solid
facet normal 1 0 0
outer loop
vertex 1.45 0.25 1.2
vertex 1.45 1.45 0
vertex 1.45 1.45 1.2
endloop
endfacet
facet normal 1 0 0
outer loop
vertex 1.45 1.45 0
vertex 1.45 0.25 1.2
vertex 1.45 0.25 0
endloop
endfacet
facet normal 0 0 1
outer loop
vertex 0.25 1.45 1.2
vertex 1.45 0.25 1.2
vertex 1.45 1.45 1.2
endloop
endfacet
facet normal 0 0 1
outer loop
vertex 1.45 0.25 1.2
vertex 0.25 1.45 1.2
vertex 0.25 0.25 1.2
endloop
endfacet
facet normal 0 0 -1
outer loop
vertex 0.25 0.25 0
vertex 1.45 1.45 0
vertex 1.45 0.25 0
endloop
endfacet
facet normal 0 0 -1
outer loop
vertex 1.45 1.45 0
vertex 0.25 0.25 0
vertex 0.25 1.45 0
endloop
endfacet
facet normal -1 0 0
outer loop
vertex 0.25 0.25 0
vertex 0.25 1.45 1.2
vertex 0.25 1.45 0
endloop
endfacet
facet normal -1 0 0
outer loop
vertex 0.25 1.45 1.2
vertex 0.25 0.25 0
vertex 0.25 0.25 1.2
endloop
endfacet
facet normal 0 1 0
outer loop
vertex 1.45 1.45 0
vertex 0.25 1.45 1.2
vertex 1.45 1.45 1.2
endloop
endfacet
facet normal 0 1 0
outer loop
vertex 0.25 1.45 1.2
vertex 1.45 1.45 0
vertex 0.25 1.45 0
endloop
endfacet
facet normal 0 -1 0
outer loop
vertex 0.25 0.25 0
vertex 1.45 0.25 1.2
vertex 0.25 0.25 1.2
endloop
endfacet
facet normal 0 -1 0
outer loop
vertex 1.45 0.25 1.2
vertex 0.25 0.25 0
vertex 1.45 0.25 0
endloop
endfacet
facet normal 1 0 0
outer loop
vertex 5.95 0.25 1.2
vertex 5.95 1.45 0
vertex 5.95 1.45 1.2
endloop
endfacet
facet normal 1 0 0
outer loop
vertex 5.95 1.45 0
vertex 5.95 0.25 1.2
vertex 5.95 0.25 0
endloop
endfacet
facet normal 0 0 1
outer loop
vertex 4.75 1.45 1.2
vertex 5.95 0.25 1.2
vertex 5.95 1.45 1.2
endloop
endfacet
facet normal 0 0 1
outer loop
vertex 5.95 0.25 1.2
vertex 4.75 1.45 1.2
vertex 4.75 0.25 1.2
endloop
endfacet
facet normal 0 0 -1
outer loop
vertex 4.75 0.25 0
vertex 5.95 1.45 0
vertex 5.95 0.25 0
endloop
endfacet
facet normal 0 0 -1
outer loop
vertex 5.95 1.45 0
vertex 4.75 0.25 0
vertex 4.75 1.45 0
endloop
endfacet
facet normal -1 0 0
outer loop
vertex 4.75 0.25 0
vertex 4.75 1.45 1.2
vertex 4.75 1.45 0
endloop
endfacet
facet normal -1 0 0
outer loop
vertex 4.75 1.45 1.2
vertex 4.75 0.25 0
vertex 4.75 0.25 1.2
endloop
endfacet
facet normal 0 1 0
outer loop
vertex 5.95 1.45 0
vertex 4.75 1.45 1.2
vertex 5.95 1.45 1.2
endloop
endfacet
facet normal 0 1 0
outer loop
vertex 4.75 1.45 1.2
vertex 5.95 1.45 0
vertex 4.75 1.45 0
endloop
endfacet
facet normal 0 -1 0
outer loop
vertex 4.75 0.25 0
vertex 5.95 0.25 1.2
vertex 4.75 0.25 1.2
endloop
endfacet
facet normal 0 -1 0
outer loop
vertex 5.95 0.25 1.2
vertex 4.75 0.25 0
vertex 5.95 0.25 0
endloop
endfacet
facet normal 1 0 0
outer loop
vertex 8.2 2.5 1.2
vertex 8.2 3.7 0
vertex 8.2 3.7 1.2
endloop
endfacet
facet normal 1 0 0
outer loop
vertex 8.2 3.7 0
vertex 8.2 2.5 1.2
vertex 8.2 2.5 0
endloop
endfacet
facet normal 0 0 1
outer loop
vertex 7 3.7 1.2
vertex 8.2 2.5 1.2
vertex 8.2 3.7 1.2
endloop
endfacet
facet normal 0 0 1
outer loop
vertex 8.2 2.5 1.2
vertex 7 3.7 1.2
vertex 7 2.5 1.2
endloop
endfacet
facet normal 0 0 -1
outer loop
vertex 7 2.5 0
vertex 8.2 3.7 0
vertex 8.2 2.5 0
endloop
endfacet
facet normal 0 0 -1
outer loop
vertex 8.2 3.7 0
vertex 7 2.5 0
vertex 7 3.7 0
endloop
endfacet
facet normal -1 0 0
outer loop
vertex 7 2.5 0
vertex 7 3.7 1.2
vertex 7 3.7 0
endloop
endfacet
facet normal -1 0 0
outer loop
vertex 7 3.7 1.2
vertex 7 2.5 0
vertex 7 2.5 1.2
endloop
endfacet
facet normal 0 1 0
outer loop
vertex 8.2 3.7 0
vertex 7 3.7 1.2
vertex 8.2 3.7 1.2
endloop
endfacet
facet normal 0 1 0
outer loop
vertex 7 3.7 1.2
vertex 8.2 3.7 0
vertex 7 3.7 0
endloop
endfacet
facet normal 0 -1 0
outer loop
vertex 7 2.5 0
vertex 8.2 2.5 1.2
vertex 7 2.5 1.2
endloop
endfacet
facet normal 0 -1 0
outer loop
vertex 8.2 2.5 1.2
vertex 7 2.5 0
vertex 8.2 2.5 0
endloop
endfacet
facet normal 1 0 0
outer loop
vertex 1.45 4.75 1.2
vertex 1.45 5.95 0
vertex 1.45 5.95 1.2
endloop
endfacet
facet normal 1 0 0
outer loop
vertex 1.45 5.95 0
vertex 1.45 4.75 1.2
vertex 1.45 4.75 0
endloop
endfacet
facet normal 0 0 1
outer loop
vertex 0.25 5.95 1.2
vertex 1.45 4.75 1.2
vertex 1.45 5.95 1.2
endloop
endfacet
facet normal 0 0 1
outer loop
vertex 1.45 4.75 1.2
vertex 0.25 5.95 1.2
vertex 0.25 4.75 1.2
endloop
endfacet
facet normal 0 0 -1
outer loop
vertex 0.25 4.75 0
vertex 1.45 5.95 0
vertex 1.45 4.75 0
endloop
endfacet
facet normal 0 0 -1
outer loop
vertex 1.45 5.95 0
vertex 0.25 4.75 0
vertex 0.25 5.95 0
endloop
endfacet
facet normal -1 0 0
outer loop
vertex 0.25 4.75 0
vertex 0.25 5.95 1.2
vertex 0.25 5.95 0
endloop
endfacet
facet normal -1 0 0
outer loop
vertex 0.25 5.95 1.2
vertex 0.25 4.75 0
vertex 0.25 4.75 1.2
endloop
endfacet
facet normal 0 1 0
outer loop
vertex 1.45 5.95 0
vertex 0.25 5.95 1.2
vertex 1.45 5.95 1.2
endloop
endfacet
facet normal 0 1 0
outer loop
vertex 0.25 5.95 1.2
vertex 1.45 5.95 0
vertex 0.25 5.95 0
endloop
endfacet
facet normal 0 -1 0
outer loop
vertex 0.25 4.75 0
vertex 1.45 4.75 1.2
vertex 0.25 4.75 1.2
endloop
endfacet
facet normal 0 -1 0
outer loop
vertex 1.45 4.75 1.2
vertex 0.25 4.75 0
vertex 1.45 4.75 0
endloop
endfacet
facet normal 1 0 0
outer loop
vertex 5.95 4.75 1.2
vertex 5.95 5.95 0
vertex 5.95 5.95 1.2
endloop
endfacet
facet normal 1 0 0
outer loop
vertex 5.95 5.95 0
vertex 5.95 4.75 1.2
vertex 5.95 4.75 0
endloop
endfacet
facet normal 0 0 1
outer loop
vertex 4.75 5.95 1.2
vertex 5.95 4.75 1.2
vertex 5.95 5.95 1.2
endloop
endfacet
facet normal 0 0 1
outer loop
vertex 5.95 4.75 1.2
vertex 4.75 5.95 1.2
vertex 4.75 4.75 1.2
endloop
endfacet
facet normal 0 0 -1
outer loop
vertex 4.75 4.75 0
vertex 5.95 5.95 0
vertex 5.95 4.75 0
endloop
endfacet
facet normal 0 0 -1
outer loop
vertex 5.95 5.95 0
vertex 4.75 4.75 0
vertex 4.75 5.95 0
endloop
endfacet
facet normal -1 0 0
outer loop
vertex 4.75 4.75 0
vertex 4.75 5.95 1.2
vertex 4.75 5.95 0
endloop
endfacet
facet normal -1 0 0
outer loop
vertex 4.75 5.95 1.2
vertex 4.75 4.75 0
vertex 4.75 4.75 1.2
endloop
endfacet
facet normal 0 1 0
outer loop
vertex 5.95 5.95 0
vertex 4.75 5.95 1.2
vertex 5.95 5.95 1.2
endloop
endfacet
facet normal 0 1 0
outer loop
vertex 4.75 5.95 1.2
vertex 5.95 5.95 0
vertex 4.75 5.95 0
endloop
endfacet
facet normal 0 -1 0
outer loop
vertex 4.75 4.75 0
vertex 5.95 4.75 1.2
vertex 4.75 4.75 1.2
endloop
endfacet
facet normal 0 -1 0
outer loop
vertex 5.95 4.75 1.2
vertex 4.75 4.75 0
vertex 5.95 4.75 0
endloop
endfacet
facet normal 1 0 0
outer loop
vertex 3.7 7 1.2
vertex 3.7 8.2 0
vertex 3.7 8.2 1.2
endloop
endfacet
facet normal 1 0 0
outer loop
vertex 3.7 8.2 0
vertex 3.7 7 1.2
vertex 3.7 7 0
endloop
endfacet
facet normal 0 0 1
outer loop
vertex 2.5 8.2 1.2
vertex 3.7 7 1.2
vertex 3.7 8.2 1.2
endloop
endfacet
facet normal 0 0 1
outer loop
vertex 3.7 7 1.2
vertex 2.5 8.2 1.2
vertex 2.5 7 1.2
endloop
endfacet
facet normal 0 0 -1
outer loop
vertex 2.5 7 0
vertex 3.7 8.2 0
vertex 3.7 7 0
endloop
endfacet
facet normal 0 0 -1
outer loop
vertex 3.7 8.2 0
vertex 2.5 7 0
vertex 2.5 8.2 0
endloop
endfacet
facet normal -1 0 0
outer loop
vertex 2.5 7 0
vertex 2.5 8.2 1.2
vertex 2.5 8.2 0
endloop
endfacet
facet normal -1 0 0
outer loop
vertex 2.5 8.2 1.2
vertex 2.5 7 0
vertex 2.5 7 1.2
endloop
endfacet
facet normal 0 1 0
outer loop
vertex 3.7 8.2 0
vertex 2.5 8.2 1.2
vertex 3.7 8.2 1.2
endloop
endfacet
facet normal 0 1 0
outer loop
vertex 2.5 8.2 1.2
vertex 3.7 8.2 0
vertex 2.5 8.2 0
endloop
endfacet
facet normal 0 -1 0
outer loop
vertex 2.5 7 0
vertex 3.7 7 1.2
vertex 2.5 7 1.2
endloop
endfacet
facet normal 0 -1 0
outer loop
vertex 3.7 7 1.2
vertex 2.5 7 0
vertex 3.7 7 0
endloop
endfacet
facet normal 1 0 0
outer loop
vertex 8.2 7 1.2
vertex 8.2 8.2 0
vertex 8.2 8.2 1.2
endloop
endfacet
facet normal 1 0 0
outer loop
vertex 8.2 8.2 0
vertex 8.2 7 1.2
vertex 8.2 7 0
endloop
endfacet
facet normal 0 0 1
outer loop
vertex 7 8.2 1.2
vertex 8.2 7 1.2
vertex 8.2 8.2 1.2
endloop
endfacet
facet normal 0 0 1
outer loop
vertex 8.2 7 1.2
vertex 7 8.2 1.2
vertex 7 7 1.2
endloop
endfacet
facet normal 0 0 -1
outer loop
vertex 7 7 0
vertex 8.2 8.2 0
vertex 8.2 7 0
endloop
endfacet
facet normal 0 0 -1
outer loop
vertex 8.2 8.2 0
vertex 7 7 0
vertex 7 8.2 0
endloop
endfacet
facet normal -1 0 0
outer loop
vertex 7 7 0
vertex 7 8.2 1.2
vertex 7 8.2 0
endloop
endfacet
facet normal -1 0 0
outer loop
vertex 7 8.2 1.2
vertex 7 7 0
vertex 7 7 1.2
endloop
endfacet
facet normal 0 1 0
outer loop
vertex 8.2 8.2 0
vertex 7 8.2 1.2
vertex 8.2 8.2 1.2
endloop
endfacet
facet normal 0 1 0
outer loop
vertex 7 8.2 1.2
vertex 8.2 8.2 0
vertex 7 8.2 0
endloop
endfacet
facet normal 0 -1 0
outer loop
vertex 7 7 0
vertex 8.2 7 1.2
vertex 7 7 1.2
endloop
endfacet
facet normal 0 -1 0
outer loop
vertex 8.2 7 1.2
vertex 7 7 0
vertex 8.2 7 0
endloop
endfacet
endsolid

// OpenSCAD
union() {
  translate([0.25, 0.25, 0.0]) cube(size=[1.2,1.2,1.2], center=false);
  translate([4.75, 0.25, 0.0]) cube(size=[1.2,1.2,1.2], center=false);
  translate([7.0, 2.5, 0.0]) cube(size=[1.2,1.2,1.2], center=false);
  translate([0.25, 4.75, 0.0]) cube(size=[1.2,1.2,1.2], center=false);
  translate([4.75, 4.75, 0.0]) cube(size=[1.2,1.2,1.2], center=false);
  translate([2.5, 7.0, 0.0]) cube(size=[1.2,1.2,1.2], center=false);
  translate([7.0, 7.0, 0.0]) cube(size=[1.2,1.2,1.2], center=false);
}
